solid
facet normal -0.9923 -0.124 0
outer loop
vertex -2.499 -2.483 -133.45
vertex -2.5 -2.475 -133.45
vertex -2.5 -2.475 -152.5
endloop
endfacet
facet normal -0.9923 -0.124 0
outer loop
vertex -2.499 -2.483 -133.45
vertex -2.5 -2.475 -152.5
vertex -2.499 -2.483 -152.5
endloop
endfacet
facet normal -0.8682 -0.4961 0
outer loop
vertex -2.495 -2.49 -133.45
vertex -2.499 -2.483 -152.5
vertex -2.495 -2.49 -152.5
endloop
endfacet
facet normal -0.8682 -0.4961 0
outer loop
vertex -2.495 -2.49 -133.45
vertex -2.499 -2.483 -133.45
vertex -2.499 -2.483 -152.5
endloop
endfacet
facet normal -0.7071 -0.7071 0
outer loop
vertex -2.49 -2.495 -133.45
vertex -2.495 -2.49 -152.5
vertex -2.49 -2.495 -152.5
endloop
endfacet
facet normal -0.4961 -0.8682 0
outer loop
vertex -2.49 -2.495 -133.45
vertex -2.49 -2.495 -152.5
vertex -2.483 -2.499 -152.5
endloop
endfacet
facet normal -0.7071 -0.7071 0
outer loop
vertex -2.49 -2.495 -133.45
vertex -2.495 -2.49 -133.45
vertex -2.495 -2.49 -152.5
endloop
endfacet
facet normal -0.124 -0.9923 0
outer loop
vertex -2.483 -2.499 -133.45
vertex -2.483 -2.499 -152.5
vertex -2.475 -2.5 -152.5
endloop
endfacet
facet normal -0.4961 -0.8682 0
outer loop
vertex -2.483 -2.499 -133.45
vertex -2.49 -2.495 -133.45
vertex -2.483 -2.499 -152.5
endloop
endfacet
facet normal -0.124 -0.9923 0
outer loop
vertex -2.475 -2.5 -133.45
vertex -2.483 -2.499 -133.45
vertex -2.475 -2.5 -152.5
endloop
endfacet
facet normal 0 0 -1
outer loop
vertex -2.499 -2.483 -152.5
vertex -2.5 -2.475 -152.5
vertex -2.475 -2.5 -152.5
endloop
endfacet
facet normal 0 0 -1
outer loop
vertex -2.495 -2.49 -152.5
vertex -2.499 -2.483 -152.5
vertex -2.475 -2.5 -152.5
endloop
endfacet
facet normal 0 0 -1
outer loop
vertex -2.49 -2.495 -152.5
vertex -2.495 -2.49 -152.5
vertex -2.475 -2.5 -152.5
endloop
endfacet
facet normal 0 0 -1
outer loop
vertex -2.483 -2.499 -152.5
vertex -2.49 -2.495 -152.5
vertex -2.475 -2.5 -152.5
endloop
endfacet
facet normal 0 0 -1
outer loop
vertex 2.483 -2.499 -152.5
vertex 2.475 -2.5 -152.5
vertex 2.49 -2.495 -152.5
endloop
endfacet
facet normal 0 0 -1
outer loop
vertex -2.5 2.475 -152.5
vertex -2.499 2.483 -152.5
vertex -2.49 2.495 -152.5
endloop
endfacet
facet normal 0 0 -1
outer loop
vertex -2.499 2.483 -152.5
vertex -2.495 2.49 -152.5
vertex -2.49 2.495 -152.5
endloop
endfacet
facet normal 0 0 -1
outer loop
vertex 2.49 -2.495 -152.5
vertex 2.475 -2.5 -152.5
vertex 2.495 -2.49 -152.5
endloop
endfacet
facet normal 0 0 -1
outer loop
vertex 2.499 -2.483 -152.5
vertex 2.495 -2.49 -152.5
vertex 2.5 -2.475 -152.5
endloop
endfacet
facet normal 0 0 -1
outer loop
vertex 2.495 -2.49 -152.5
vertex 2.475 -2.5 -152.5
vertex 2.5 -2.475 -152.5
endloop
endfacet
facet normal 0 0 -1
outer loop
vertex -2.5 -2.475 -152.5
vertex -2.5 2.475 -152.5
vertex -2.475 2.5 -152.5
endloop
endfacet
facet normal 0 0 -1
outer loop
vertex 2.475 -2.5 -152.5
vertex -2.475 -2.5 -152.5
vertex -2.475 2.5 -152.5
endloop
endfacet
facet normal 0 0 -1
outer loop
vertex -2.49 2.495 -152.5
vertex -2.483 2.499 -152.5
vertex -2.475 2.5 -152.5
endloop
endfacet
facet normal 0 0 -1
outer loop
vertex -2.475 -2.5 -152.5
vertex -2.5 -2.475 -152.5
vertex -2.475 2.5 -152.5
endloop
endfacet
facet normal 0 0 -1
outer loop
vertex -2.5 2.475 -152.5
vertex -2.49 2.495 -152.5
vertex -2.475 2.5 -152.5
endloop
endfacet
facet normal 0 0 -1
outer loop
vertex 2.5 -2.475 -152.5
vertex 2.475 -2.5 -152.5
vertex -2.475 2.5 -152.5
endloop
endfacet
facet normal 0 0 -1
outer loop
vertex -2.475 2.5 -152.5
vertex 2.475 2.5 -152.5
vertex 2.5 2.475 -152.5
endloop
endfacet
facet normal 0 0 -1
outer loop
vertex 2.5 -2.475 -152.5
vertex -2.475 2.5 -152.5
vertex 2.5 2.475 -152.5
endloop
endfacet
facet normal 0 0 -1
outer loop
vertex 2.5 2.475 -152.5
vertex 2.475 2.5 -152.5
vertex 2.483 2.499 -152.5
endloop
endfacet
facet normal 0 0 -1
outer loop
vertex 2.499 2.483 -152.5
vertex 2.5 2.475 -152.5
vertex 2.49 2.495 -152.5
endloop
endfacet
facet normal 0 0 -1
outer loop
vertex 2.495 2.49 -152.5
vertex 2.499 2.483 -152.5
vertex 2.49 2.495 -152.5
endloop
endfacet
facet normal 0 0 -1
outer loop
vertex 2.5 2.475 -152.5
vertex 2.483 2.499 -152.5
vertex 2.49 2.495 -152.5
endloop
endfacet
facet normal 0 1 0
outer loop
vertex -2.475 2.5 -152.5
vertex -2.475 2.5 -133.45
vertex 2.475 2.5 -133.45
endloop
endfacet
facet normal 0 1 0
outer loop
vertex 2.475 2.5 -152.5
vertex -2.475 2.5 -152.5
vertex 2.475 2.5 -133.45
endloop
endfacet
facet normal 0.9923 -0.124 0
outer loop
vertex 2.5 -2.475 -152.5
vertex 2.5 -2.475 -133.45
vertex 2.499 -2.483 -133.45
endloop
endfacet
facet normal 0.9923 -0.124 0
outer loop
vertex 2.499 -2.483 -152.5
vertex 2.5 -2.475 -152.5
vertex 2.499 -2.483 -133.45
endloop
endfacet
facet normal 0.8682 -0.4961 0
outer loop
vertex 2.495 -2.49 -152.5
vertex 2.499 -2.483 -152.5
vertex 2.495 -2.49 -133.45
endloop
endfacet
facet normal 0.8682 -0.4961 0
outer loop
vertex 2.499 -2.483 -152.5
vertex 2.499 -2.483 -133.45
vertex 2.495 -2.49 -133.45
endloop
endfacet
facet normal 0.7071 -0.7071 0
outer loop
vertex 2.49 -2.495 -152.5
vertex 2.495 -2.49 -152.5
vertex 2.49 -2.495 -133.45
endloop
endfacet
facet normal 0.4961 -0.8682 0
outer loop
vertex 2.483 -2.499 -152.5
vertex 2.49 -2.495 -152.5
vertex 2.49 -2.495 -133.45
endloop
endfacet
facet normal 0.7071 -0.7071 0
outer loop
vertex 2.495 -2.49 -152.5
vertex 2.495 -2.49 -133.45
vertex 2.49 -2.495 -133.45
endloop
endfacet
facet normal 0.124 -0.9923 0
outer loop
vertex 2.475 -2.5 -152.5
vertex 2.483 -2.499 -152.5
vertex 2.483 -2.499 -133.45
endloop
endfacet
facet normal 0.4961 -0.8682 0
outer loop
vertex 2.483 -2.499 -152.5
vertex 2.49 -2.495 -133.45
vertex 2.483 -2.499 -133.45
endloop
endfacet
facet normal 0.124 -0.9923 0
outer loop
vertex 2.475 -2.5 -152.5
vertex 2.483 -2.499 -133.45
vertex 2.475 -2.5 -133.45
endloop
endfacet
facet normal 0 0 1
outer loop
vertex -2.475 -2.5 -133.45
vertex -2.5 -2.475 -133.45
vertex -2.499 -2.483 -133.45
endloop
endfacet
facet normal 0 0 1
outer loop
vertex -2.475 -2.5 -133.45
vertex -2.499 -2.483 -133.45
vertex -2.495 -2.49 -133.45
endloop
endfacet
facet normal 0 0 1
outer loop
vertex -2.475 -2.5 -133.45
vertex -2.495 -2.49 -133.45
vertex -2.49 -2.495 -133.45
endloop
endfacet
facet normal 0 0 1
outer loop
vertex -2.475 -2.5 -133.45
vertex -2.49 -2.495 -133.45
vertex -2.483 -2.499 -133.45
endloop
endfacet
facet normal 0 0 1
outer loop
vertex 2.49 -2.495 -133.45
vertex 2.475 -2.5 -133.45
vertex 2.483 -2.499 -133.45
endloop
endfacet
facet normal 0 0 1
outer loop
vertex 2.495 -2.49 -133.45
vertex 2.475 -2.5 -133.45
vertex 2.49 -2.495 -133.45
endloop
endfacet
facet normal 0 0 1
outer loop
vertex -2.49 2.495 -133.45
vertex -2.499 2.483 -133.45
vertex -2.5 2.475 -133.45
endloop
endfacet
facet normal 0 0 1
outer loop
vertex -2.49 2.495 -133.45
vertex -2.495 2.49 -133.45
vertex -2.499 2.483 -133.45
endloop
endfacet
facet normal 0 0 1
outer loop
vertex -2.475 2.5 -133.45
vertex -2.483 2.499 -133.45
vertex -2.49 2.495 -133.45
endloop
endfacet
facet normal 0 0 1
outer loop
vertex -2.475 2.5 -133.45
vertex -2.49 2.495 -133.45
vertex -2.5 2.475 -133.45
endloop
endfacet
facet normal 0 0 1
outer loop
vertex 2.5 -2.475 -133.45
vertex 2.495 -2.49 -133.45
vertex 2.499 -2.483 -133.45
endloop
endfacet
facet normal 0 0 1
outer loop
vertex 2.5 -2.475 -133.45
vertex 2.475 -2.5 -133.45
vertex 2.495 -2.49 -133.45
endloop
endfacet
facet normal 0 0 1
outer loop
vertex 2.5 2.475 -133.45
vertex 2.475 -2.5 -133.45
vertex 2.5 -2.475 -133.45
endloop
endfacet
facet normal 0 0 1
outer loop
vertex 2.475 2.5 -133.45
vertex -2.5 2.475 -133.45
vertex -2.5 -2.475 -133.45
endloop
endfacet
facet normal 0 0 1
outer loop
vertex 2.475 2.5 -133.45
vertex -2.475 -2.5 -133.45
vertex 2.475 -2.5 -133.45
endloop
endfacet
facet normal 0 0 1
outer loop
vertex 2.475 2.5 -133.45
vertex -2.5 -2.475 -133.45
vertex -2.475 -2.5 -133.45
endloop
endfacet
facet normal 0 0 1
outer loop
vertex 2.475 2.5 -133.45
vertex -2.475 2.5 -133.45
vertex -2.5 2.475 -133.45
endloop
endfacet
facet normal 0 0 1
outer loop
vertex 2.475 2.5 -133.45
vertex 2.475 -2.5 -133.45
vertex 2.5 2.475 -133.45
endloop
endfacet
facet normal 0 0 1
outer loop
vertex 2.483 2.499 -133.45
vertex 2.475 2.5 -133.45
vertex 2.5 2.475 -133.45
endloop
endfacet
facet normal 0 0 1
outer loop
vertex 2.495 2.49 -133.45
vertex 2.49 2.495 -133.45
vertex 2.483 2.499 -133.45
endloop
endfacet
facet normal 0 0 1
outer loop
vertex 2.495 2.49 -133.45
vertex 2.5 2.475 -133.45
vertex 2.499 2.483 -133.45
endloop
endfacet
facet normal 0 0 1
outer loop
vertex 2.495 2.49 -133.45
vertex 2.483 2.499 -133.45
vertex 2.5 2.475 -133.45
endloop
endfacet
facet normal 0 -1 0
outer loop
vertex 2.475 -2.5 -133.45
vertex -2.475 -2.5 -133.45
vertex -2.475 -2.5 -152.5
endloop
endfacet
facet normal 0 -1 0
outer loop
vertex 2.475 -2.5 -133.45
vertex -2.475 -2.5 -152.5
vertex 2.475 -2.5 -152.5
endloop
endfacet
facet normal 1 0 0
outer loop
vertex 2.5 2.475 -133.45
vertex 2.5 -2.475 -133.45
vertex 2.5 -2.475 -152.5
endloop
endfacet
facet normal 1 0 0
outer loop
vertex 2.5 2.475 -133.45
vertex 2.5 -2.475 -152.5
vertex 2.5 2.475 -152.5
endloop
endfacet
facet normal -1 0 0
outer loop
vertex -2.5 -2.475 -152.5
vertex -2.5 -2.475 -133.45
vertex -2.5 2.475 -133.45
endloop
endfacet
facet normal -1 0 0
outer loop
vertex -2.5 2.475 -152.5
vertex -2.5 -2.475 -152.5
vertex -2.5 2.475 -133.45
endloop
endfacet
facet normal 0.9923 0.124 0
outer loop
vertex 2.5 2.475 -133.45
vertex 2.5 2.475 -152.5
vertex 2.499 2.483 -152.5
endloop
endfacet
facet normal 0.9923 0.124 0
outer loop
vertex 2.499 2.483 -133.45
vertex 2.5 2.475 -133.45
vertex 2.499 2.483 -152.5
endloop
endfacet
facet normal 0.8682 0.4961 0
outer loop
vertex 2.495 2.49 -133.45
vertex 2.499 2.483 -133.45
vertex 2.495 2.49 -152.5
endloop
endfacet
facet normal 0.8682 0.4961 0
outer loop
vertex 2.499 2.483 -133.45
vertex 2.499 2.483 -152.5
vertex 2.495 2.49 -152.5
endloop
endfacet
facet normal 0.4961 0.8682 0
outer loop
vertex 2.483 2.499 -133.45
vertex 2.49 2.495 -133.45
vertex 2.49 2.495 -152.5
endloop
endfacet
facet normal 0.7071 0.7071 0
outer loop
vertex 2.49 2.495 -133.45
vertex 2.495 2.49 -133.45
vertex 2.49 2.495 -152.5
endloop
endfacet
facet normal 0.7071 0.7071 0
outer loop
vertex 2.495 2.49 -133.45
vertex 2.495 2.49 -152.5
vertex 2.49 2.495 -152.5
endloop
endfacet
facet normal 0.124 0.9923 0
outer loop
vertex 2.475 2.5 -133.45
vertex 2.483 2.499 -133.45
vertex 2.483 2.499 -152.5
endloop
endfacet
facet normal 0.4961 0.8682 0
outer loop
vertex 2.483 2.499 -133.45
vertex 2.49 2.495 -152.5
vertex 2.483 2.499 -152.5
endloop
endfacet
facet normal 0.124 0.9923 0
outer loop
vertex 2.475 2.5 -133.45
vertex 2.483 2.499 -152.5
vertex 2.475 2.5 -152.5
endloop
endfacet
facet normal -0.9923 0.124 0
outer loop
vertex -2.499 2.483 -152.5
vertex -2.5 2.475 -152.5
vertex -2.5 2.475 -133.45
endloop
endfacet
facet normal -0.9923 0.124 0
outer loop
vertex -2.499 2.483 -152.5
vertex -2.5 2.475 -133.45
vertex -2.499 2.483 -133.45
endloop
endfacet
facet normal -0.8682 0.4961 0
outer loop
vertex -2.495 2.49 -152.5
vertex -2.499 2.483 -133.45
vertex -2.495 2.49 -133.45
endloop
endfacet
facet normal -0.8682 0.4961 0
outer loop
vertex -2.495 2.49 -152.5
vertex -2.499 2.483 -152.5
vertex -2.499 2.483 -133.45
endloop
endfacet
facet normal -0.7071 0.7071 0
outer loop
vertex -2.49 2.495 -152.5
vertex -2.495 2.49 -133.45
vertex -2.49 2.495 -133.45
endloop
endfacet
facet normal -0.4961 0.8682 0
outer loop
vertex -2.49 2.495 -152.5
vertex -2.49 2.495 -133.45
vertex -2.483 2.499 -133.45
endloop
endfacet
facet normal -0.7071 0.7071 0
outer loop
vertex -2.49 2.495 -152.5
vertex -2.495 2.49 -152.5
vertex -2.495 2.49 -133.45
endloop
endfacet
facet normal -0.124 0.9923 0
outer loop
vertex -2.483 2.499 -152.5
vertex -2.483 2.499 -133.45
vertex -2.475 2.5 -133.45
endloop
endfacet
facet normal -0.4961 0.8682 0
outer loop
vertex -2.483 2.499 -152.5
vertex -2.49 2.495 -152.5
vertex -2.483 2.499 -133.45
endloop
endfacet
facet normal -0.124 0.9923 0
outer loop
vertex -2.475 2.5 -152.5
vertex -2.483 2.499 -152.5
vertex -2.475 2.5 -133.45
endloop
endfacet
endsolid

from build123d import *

# Parameters (mm, degrees)
SKETCH3_W           = 5
SKETCH3_H           = 5
BOSS_EXTRUDE1_DEPTH = 152.5
FILLET1_R           = 0.025
SKETCH4_W           = 5
SKETCH4_H           = 5
CUT_EXTRUDE1_DEPTH  = 285.95


with BuildPart() as part:
    # Sketch3 → Boss-Extrude1 (new, symmetric)
    with BuildSketch(Plane.XY):
        Rectangle(SKETCH3_W, SKETCH3_H)
    extrude(amount=BOSS_EXTRUDE1_DEPTH, both=True)

    # Fillet1
    fillet1_edges = [part.edges().sort_by_distance(p)[0] for p in [
        (-2.5, -2.5, 0),
        (-2.5, 2.5, 0),
        (2.5, 2.5, 0),
        (2.5, -2.5, 0),
    ]]
    fillet(fillet1_edges, radius=FILLET1_R)

    # Sketch4 → Cut-Extrude1 (cut)
    with BuildSketch(Plane.XY.offset(152.5)):
        Rectangle(SKETCH4_W, SKETCH4_H)
    extrude(amount=-CUT_EXTRUDE1_DEPTH, mode=Mode.SUBTRACT)


solid = part.part
